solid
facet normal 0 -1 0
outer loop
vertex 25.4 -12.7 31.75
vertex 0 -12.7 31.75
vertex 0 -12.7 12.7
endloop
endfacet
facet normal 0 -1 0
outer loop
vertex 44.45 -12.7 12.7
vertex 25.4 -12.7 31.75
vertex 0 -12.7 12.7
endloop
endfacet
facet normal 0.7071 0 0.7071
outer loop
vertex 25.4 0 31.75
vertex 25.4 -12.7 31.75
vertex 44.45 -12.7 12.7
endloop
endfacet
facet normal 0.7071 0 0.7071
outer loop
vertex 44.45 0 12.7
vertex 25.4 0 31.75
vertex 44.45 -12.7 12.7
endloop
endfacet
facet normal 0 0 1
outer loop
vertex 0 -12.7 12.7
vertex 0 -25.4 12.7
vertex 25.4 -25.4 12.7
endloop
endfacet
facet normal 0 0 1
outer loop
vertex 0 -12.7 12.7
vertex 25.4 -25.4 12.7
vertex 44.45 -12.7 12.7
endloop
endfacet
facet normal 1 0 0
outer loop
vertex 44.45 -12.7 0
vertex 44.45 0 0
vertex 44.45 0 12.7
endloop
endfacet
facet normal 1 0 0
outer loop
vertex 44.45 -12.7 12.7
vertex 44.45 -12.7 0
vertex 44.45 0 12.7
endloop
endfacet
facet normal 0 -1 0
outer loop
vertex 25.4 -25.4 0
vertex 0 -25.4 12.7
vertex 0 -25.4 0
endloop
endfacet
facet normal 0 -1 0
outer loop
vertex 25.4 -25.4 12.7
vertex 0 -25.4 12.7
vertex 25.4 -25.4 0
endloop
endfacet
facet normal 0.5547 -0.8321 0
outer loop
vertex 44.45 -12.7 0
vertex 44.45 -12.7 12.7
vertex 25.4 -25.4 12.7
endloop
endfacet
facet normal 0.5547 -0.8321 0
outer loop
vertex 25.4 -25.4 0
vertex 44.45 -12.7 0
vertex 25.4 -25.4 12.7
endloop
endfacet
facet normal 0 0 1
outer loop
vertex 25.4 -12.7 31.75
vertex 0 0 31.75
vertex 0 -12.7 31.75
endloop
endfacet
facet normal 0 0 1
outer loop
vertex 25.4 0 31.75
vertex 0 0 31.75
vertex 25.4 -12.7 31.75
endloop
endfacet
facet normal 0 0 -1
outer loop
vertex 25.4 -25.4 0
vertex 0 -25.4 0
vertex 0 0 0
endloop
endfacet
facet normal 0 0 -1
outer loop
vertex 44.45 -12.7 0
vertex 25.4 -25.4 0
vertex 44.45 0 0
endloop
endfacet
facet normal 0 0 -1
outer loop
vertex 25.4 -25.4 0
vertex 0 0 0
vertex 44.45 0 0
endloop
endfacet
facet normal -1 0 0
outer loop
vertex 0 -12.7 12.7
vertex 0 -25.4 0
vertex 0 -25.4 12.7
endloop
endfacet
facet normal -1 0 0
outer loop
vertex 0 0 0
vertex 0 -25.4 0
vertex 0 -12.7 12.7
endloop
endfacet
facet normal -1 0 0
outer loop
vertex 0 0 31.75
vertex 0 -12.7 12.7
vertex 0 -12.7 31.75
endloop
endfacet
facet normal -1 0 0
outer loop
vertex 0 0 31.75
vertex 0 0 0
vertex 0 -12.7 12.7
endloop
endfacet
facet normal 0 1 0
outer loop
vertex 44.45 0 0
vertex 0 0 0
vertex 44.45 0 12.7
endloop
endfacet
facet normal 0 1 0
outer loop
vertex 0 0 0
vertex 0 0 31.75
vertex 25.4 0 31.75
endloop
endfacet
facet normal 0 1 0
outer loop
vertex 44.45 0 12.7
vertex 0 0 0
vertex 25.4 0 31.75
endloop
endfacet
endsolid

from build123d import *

# Parameters (mm, degrees)
F0_W     = 44.45
F0_H     = 31.75
F1_DEPTH = 25.4
F2_W     = 44.45
F2_H     = 19.05
F3_DEPTH = 12.7
F5_DEPTH = 12.701
F7_DEPTH = 12.701


with BuildPart() as f1:
    # F0 (on Front) → F1 (new body)
    with BuildSketch(Plane.XZ):
        with Locations((22.225, 15.875)):
            Rectangle(F0_W, F0_H)
    extrude(amount=F1_DEPTH)

    # F2 (on face) → F3 (cut)
    with BuildSketch(Plane.XZ.offset(25.4)):
        with Locations((22.225, 22.225)):
            Rectangle(F2_W, F2_H)
    extrude(amount=-F3_DEPTH, mode=Mode.SUBTRACT)

    # F4 (on face) → F5 (cut, through all)
    with BuildSketch(Plane.XZ.offset(12.7)):
        Polygon((44.45, 31.75), (25.4, 31.75), (44.45, 12.7), align=None)
    extrude(amount=-F5_DEPTH, mode=Mode.SUBTRACT)

    # F6 (on face) → F7 (cut, through all)
    with BuildSketch(Plane.XY.offset(12.7)):
        Polygon((44.45, -25.4), (44.45, -12.7), (25.4, -25.4), align=None)
    extrude(amount=-F7_DEPTH, mode=Mode.SUBTRACT)


solid = f1.part
